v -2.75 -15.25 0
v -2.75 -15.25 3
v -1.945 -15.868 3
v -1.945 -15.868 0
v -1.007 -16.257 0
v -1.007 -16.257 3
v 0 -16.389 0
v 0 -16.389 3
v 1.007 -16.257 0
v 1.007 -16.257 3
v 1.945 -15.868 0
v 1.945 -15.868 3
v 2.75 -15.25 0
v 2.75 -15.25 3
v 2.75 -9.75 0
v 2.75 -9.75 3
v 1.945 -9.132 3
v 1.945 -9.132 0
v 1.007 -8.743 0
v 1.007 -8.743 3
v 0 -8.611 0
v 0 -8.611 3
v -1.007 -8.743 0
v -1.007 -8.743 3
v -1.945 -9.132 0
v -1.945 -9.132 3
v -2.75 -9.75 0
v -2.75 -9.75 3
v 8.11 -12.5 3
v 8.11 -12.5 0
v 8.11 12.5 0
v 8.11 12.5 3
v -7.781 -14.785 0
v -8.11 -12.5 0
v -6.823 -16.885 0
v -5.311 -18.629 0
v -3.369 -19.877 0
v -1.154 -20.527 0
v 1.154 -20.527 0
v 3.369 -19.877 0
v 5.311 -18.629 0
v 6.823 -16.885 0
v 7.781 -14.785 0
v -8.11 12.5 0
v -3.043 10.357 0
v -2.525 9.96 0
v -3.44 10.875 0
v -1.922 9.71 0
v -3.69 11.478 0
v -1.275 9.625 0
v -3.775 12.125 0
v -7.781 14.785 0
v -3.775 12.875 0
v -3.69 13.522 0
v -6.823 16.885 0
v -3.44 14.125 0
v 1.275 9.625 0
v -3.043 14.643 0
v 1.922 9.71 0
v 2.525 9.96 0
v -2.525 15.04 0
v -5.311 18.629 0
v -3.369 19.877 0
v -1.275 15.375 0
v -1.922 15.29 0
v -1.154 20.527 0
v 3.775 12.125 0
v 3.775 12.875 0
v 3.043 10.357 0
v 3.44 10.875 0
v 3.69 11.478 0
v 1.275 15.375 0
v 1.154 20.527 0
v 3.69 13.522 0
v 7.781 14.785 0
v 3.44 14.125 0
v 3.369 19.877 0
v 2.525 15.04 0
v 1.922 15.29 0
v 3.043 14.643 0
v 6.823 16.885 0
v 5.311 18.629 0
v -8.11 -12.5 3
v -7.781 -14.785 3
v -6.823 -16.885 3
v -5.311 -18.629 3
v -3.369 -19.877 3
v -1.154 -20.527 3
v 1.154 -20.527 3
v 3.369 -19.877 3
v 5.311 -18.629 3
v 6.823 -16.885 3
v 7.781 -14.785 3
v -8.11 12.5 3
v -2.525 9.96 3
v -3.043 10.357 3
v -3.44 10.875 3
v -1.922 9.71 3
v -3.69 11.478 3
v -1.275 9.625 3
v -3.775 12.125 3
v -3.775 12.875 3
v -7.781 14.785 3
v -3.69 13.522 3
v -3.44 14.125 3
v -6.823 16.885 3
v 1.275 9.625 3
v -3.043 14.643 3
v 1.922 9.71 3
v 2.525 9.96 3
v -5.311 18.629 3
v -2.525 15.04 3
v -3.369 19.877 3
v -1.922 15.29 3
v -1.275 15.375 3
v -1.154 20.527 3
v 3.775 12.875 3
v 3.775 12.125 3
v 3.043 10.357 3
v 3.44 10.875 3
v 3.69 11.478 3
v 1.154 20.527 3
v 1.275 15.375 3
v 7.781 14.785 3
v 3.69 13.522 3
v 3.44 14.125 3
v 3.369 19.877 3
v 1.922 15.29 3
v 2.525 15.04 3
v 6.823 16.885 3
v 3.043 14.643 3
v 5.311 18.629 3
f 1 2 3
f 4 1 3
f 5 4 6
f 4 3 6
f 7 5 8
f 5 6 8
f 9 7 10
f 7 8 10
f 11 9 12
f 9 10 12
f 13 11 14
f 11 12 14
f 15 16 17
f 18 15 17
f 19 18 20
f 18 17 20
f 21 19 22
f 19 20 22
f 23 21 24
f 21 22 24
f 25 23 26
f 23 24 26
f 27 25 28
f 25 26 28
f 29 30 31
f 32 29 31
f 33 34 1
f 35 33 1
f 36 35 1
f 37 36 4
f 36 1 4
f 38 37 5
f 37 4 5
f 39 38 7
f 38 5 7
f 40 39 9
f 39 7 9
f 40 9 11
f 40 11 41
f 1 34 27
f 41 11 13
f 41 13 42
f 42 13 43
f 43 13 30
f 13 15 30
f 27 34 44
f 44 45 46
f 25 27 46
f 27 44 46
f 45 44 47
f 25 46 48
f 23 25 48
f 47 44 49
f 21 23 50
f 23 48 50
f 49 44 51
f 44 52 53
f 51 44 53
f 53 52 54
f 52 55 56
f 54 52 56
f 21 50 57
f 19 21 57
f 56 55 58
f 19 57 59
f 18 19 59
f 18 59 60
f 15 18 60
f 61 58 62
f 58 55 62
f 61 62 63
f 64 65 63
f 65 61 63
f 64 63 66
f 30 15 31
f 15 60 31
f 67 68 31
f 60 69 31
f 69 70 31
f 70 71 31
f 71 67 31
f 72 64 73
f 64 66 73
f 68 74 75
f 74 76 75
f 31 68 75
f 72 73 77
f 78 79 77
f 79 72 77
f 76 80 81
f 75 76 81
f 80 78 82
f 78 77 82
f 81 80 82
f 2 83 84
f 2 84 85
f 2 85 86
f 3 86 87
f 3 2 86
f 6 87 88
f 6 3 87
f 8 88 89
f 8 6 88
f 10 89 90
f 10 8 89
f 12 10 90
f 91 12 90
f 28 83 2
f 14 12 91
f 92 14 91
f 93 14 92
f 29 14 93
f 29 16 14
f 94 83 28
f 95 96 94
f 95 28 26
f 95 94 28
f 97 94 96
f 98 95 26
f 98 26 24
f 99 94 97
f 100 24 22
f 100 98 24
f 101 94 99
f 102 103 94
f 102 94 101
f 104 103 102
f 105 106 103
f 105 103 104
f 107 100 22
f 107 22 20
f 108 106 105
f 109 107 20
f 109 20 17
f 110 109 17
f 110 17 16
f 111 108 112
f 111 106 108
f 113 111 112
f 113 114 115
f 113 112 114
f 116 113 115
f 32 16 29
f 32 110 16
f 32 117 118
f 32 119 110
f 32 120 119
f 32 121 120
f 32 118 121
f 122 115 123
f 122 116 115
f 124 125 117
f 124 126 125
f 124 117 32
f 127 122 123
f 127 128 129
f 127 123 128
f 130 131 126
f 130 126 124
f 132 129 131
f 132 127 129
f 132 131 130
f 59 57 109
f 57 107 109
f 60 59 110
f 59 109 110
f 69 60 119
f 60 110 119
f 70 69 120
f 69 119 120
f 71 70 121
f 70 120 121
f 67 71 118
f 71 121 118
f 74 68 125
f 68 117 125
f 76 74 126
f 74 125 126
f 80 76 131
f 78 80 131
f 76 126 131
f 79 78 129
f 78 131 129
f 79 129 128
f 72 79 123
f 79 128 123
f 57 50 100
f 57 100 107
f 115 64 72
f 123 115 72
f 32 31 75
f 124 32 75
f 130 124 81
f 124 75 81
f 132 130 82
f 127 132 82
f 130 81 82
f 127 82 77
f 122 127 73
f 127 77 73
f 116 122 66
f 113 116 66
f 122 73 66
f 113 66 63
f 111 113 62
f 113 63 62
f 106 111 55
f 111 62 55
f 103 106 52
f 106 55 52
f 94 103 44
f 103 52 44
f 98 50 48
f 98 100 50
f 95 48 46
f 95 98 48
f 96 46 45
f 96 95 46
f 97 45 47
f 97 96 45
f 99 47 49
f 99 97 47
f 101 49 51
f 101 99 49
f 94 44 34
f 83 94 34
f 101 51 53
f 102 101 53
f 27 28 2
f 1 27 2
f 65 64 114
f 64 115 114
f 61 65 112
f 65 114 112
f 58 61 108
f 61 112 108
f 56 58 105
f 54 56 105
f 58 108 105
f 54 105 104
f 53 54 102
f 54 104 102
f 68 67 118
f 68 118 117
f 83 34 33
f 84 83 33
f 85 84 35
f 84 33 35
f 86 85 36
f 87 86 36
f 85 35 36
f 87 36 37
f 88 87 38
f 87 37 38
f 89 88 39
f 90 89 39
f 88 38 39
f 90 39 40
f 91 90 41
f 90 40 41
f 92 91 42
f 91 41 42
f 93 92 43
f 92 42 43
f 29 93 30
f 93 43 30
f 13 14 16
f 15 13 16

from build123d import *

# Parameters (mm, degrees)
SKETCH1_W           = 7.55
SKETCH1_H           = 5.75
BOSS_EXTRUDE1_DEPTH = 3
FILLET1_R           = 2.5
CUT_EXTRUDE1_DEPTH  = 3


with BuildPart() as part:
    # Sketch1 → Boss-Extrude1 (new body)
    with BuildSketch(Plane.XY):
        with BuildLine():
            Line((-8.11, 12.5), (-8.11, -12.5))
            ThreePointArc((-8.11, -12.5), (0, -20.61), (8.11, -12.5))
            Line((8.11, -12.5), (8.11, 12.5))
            ThreePointArc((8.11, 12.5), (0, 20.61), (-8.11, 12.5))
        make_face()
        with Locations((0, 12.5)):
            Rectangle(SKETCH1_W, SKETCH1_H, mode=Mode.SUBTRACT)
    extrude(amount=BOSS_EXTRUDE1_DEPTH)

    # Fillet1
    fillet1_edges = [part.edges().sort_by_distance(p)[0] for p in [
        (3.775, 9.625, 1.5),
        (3.775, 15.375, 1.5),
        (-3.775, 15.375, 1.5),
        (-3.775, 9.625, 1.5),
    ]]
    fillet(fillet1_edges, radius=FILLET1_R)

    # Sketch2 → Cut-Extrude1 (cut)
    with BuildSketch(Plane.XY.offset(3)):
        with BuildLine():
            Line((-2.75, -9.75), (-2.75, -15.25))
            ThreePointArc((-2.75, -15.25), (0, -16.389087297), (2.75, -15.25))
            Line((2.75, -15.25), (2.75, -9.75))
            ThreePointArc((2.75, -9.75), (0, -8.610912703), (-2.75, -9.75))
        make_face()
    extrude(amount=-CUT_EXTRUDE1_DEPTH, mode=Mode.SUBTRACT)


solid = part.part
